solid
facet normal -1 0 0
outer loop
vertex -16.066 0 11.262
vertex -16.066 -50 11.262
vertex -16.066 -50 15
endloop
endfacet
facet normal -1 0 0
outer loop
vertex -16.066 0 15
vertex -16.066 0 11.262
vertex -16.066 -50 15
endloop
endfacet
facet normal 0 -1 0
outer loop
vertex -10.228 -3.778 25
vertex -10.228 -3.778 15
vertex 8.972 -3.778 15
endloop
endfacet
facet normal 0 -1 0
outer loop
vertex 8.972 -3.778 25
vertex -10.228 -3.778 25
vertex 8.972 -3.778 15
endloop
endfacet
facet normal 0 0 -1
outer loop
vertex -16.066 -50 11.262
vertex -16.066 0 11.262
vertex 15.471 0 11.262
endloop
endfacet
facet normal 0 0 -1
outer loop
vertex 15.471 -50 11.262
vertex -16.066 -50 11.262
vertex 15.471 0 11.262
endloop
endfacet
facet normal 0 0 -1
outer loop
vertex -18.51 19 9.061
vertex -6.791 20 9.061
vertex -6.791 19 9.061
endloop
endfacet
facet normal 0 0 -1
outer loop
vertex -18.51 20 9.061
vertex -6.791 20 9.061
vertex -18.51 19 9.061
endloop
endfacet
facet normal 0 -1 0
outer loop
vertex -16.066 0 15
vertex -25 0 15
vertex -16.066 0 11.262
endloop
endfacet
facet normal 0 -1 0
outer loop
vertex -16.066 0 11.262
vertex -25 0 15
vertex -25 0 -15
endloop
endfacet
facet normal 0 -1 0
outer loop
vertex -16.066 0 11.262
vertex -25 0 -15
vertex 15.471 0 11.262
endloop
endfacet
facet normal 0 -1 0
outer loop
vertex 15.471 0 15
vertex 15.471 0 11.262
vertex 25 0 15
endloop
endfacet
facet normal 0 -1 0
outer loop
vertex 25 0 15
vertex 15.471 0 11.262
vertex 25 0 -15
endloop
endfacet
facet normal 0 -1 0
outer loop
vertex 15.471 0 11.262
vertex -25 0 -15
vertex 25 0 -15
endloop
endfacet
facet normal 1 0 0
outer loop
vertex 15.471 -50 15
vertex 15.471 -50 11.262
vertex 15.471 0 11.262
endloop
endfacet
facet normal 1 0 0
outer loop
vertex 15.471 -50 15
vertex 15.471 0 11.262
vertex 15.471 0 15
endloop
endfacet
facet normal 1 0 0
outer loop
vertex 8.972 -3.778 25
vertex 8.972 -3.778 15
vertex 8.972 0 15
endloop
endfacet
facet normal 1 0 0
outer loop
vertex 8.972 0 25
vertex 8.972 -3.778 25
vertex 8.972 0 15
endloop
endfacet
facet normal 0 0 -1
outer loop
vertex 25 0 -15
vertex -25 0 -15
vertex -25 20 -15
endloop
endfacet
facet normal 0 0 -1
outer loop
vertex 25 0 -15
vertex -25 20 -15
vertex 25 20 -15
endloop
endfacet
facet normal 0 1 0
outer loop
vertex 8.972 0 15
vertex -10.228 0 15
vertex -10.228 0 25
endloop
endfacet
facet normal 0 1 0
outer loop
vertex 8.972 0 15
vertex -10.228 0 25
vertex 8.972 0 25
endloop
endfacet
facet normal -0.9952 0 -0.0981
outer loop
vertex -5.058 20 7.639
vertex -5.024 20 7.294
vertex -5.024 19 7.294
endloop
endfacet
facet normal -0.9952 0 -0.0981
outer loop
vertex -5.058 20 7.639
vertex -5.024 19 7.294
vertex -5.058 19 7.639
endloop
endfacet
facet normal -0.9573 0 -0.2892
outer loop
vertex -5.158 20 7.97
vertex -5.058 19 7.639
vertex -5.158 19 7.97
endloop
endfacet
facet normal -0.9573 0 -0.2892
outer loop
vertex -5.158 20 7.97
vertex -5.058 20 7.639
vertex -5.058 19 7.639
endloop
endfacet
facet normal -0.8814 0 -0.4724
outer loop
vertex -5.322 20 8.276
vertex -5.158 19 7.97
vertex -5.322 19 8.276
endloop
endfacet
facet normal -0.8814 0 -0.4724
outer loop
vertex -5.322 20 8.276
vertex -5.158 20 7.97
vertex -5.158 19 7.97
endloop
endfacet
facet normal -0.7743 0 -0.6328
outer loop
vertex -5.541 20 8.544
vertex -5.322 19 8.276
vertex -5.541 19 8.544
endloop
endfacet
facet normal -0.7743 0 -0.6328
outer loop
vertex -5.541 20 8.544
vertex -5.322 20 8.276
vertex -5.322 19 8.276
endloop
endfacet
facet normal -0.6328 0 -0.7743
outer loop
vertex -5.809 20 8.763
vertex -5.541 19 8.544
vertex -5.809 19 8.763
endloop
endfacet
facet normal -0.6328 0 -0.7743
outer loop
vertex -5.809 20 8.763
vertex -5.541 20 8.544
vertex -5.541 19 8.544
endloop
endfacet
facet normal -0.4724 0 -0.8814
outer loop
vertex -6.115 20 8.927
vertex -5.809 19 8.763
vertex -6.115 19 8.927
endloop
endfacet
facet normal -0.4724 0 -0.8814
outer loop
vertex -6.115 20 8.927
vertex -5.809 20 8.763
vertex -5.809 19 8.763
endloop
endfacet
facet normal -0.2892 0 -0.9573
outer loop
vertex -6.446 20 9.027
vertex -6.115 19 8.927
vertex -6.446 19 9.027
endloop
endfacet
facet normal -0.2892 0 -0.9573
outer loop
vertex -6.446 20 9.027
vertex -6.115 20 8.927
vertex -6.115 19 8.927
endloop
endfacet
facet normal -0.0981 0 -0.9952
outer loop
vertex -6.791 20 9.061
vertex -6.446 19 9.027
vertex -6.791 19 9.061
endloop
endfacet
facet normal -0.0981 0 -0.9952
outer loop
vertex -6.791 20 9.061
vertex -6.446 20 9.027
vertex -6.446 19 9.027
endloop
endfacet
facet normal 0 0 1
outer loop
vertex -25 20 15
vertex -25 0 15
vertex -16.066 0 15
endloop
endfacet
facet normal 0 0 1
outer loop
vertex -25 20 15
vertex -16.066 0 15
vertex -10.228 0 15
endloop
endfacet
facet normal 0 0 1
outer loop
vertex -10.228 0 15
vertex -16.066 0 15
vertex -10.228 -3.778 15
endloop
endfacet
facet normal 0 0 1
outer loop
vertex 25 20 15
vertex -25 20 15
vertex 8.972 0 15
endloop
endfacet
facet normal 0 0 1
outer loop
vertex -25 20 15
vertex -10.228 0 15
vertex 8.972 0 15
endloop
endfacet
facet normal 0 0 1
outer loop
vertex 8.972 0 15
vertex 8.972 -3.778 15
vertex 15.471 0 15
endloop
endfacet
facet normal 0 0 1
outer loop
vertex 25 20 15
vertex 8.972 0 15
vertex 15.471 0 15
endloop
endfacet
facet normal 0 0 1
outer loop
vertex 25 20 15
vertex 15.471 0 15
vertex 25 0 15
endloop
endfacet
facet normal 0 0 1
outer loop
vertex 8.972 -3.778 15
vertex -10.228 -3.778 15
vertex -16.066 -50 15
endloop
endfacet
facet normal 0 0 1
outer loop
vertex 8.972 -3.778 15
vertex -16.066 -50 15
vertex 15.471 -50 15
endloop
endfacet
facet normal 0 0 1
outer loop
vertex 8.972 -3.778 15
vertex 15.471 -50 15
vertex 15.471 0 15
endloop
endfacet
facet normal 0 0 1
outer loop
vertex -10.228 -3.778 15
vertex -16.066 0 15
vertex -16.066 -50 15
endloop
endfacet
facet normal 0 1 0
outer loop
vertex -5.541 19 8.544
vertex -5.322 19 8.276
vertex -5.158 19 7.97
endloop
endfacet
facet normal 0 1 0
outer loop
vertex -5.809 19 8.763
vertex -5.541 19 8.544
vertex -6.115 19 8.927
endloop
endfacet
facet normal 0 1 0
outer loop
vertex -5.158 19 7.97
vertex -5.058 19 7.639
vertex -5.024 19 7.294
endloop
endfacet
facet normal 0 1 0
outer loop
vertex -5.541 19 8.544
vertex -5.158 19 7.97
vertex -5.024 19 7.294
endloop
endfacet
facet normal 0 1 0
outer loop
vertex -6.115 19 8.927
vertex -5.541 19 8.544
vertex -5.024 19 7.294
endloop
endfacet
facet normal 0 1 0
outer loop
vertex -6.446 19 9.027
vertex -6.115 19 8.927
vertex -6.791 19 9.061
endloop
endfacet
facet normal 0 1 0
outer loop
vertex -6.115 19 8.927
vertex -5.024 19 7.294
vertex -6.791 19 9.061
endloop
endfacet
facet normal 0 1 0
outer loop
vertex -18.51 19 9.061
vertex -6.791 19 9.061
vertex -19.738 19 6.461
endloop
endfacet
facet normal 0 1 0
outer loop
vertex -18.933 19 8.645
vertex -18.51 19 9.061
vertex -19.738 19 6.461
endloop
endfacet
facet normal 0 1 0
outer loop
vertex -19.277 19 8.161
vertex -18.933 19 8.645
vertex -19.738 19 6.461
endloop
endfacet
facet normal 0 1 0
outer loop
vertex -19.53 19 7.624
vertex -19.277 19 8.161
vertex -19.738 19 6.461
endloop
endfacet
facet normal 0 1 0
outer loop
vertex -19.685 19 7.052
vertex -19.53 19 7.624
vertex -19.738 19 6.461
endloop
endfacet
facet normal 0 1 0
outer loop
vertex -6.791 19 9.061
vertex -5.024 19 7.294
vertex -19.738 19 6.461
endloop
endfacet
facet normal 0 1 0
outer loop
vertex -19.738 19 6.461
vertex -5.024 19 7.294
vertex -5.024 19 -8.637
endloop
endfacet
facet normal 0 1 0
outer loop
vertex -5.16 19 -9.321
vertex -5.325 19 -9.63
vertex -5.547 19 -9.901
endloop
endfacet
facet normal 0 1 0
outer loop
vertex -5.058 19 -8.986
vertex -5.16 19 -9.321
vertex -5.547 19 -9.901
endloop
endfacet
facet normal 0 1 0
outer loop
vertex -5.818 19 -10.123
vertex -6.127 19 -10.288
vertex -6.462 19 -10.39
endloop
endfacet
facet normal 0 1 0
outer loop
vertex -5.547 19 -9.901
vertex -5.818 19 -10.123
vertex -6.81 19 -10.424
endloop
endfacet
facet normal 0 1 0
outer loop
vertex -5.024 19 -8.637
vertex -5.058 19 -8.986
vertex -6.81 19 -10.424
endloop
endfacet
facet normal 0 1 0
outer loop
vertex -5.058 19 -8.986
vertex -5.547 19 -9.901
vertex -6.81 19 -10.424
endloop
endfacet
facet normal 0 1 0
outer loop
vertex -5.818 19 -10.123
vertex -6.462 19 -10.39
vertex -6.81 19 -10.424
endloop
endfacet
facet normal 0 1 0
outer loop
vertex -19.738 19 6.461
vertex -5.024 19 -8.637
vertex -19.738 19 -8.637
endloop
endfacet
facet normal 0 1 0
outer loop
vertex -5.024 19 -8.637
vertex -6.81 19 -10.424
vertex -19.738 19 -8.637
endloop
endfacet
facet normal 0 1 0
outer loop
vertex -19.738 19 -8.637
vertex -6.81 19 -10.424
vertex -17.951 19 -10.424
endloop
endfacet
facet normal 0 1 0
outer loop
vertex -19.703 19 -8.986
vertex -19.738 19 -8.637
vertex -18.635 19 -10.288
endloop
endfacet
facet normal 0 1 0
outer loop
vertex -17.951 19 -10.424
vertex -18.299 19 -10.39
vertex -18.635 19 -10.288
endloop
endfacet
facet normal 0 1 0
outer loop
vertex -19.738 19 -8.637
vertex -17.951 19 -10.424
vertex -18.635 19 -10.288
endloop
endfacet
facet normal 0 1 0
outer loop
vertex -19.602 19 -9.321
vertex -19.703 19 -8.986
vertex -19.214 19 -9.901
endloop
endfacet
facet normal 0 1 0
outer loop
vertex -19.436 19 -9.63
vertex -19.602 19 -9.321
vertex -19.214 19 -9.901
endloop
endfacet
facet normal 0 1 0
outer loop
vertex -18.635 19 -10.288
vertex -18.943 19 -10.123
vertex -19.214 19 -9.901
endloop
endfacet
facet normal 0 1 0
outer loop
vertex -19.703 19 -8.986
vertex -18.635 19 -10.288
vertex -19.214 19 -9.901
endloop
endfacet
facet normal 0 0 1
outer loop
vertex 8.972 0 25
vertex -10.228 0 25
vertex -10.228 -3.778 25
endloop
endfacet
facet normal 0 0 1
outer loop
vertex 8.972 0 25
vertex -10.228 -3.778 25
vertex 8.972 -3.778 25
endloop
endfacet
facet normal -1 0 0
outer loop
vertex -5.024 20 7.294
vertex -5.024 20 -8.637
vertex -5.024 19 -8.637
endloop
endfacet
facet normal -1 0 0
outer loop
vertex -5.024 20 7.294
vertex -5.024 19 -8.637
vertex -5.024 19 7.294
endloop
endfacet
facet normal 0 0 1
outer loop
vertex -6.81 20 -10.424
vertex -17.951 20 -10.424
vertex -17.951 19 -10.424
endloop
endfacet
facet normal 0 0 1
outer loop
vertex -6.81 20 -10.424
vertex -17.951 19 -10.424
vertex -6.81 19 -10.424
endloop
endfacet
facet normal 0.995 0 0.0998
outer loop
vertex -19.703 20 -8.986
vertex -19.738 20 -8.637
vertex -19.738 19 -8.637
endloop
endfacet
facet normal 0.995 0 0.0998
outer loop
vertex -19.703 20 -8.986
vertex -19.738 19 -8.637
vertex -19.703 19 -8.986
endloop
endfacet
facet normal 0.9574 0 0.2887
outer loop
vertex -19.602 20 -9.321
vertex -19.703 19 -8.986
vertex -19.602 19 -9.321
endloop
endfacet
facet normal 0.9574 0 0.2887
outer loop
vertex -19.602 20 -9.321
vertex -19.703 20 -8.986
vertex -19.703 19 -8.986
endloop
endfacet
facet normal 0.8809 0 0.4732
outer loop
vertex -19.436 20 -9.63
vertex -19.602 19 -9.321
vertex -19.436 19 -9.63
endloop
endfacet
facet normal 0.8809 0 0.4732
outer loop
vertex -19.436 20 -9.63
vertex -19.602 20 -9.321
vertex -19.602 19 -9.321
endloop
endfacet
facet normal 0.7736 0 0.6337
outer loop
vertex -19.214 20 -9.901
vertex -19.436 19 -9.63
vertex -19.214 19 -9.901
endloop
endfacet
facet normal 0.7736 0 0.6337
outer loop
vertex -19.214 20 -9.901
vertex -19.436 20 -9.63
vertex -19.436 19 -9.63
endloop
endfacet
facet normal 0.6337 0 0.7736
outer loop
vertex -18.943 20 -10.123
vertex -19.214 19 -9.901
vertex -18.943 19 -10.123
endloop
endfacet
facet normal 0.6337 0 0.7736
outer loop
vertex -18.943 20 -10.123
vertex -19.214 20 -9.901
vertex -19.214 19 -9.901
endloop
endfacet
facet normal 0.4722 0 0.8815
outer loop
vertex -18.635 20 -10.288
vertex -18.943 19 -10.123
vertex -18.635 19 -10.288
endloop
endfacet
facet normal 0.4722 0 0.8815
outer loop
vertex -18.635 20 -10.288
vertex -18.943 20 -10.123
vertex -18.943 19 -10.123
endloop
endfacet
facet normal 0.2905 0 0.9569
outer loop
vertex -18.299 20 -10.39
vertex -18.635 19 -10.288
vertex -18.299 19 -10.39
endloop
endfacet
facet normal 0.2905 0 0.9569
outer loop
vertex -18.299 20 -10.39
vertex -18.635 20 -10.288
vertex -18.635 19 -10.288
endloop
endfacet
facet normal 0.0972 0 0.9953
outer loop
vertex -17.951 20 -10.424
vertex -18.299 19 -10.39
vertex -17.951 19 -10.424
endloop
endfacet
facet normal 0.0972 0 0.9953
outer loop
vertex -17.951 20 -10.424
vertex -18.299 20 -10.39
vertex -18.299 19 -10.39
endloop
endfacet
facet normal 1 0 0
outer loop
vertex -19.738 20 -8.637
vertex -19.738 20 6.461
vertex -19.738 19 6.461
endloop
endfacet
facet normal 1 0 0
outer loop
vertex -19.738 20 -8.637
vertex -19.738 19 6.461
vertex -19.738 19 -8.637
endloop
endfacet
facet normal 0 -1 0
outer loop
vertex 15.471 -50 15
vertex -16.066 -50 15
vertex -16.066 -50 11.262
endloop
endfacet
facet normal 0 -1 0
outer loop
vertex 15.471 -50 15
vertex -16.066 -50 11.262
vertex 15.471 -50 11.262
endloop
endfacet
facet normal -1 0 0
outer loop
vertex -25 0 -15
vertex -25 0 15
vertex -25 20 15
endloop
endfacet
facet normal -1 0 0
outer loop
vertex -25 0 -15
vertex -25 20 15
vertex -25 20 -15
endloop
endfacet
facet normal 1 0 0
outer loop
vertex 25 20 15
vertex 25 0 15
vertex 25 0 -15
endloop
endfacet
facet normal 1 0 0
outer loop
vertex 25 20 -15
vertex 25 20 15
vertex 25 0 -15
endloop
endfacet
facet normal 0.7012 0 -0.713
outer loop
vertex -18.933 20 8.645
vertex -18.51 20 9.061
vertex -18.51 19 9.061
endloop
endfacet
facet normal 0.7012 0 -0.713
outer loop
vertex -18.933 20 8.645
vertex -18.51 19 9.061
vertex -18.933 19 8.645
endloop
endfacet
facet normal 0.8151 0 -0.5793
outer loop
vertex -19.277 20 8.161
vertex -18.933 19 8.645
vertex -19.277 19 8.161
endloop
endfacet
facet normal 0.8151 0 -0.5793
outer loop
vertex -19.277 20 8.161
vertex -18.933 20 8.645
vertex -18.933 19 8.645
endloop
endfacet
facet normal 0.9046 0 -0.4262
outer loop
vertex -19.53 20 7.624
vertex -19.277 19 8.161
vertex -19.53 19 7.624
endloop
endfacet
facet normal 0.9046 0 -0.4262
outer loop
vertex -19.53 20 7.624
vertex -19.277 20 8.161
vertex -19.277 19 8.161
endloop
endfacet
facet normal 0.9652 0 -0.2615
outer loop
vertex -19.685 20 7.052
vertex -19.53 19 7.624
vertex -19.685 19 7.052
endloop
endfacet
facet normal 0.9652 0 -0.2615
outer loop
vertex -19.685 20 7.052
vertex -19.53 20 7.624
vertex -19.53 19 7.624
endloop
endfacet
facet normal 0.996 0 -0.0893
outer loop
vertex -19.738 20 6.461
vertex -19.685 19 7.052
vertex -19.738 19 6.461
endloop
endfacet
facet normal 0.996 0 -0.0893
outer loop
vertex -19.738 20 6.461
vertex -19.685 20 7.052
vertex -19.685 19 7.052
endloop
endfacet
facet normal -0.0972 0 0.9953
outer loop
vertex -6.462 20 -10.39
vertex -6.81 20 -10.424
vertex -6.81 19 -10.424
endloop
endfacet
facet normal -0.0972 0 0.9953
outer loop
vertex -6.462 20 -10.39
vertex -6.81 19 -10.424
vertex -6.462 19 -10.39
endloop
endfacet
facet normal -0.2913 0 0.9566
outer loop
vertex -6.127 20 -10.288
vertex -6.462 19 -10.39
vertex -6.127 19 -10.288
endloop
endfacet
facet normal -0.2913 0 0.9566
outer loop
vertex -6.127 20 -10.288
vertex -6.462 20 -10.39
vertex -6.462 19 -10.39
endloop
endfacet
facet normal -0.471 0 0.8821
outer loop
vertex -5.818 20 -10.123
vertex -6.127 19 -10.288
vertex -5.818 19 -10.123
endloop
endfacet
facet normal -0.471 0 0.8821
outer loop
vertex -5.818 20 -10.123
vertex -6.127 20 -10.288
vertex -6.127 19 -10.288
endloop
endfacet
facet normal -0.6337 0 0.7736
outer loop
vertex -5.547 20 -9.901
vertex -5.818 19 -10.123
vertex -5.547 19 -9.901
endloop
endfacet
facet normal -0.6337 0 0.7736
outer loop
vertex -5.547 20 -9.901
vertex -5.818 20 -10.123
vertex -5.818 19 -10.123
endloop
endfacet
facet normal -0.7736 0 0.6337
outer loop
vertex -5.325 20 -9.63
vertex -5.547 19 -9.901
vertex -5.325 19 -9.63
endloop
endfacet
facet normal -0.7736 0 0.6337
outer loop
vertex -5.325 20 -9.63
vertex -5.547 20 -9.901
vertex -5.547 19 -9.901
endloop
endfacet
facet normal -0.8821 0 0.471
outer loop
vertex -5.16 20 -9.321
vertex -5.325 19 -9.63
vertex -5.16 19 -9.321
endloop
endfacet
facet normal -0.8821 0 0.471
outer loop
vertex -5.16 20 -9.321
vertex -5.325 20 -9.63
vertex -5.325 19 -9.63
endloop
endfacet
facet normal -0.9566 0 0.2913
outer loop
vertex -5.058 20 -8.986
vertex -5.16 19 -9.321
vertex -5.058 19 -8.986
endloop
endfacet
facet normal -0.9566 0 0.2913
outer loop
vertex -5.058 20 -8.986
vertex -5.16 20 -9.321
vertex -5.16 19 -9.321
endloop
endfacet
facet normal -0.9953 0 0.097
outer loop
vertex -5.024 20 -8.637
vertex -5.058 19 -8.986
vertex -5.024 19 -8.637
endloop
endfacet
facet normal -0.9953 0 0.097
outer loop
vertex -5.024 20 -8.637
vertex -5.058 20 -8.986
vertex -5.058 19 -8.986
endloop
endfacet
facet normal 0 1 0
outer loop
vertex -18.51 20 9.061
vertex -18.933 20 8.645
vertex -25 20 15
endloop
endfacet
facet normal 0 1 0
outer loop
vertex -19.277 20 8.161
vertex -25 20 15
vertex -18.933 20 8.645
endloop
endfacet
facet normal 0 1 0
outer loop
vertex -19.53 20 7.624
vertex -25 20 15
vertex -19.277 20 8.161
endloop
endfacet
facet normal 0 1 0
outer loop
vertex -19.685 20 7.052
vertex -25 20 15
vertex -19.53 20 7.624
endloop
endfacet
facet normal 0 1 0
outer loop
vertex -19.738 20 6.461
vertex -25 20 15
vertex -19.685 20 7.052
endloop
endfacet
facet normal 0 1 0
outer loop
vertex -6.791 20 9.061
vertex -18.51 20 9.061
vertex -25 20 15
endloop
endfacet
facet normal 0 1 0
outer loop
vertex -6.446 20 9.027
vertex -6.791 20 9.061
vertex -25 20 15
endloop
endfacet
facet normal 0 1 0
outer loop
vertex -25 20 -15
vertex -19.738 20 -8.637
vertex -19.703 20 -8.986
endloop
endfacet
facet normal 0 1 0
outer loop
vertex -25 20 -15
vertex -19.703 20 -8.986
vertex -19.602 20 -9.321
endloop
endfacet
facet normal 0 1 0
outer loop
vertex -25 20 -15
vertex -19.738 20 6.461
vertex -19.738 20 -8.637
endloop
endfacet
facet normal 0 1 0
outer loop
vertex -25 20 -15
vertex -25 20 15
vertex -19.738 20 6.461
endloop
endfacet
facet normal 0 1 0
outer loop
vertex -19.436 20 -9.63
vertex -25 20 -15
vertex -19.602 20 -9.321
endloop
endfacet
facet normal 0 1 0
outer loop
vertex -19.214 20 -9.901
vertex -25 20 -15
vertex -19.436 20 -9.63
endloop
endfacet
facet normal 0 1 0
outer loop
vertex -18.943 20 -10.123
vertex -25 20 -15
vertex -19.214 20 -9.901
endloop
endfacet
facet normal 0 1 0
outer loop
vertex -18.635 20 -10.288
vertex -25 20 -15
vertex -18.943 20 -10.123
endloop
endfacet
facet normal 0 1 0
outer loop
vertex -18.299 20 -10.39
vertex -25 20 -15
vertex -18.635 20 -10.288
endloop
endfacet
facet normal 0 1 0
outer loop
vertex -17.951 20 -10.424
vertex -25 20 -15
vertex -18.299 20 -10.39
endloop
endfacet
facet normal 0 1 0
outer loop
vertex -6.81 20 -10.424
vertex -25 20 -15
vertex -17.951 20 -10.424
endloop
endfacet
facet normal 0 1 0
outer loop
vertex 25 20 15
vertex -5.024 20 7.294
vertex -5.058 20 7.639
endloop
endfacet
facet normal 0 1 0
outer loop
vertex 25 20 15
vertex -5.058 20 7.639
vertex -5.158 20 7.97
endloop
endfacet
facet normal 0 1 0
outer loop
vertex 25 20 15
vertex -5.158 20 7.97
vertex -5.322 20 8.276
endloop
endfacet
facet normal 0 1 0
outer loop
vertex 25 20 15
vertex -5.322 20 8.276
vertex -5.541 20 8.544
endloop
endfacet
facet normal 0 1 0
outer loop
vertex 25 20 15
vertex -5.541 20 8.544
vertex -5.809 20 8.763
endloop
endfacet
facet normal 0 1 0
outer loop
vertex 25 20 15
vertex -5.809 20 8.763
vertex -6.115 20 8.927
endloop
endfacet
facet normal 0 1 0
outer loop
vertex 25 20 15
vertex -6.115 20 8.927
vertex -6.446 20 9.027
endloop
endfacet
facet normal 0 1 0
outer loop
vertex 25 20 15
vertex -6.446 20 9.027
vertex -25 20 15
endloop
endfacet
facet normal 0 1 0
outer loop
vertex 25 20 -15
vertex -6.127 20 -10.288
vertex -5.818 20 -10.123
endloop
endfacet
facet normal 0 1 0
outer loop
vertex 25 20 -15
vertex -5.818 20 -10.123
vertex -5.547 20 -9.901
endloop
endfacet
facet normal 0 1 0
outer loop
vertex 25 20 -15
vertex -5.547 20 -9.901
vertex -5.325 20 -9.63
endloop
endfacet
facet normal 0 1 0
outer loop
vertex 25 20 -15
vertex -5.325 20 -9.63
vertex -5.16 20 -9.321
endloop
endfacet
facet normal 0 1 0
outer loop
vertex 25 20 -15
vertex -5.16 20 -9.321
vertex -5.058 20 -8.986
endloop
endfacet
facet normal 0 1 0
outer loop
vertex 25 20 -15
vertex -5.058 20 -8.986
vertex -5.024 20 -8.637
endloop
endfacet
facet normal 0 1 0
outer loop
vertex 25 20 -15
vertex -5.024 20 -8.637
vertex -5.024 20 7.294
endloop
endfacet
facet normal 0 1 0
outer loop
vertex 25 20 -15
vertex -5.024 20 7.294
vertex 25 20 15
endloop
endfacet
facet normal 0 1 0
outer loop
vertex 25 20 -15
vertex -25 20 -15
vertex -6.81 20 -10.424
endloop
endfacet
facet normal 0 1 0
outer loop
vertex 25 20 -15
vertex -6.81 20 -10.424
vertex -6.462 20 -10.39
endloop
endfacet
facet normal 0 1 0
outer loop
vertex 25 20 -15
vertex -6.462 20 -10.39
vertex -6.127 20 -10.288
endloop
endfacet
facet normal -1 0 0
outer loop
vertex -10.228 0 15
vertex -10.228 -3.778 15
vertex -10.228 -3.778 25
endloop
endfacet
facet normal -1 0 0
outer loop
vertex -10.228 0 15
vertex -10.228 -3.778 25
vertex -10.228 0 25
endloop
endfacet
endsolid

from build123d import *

# Parameters (mm, degrees)
CROQUIS1_W              = 50
CROQUIS1_H              = 30
SALIENTE_EXTRUIR1_DEPTH = 20
CORTAR_EXTRUIR1_DEPTH   = 1
CROQUIS3_W              = 31.537351035
CROQUIS3_H              = 3.738113103
SALIENTE_EXTRUIR2_DEPTH = 50
CROQUIS4_W              = 19.19980798
CROQUIS4_H              = 3.778383676
SALIENTE_EXTRUIR3_DEPTH = 10


with BuildPart() as part:
    # Croquis1 → Saliente-Extruir1 (new body)
    with BuildSketch(Plane(origin=(0, 0, 0), x_dir=(1, 0, 0), z_dir=(0, 1, 0))):
        Rectangle(CROQUIS1_W, CROQUIS1_H)
    extrude(amount=SALIENTE_EXTRUIR1_DEPTH)

    # Croquis2 → Cortar-Extruir1 (cut)
    with BuildSketch(Plane(origin=(0, 20, 0), x_dir=(1, 0, 0), z_dir=(0, 1, 0))):
        with BuildLine():
            Line((-17.950861779, 10.424113245), (-6.810393923, 10.424113245))
            ThreePointArc((-6.810393923, 10.424113245), (-5.547045664, 9.900817262), (-5.023749681, 8.637469002))
            Line((-5.023749681, 8.637469002), (-5.023749681, -7.293911131))
            ThreePointArc((-5.023749681, -7.293911131), (-5.541364738, -8.543544422), (-6.790998029, -9.061159479))
            Line((-6.790998029, -9.061159479), (-18.510223917, -9.061159479))
            ThreePointArc((-18.510223917, -9.061159479), (-19.415274859, -7.898406759), (-19.737506021, -6.460603513))
            Line((-19.737506021, -6.460603513), (-19.737506021, 8.637469002))
            ThreePointArc((-19.737506021, 8.637469002), (-19.214210038, 9.900817262), (-17.950861779, 10.424113245))
        make_face()
    extrude(amount=-CORTAR_EXTRUIR1_DEPTH, mode=Mode.SUBTRACT)

    # Croquis3 → Saliente-Extruir2 (add)
    with BuildSketch(Plane.XZ):
        with Locations((-0.297550373, 13.130943449)):
            Rectangle(CROQUIS3_W, CROQUIS3_H)
    extrude(amount=SALIENTE_EXTRUIR2_DEPTH)

    # Croquis4 → Saliente-Extruir3 (add)
    with BuildSketch(Plane.XY.offset(15)):
        with Locations((-0.62783913, -1.889191838)):
            Rectangle(CROQUIS4_W, CROQUIS4_H)
    extrude(amount=SALIENTE_EXTRUIR3_DEPTH)


solid = part.part
